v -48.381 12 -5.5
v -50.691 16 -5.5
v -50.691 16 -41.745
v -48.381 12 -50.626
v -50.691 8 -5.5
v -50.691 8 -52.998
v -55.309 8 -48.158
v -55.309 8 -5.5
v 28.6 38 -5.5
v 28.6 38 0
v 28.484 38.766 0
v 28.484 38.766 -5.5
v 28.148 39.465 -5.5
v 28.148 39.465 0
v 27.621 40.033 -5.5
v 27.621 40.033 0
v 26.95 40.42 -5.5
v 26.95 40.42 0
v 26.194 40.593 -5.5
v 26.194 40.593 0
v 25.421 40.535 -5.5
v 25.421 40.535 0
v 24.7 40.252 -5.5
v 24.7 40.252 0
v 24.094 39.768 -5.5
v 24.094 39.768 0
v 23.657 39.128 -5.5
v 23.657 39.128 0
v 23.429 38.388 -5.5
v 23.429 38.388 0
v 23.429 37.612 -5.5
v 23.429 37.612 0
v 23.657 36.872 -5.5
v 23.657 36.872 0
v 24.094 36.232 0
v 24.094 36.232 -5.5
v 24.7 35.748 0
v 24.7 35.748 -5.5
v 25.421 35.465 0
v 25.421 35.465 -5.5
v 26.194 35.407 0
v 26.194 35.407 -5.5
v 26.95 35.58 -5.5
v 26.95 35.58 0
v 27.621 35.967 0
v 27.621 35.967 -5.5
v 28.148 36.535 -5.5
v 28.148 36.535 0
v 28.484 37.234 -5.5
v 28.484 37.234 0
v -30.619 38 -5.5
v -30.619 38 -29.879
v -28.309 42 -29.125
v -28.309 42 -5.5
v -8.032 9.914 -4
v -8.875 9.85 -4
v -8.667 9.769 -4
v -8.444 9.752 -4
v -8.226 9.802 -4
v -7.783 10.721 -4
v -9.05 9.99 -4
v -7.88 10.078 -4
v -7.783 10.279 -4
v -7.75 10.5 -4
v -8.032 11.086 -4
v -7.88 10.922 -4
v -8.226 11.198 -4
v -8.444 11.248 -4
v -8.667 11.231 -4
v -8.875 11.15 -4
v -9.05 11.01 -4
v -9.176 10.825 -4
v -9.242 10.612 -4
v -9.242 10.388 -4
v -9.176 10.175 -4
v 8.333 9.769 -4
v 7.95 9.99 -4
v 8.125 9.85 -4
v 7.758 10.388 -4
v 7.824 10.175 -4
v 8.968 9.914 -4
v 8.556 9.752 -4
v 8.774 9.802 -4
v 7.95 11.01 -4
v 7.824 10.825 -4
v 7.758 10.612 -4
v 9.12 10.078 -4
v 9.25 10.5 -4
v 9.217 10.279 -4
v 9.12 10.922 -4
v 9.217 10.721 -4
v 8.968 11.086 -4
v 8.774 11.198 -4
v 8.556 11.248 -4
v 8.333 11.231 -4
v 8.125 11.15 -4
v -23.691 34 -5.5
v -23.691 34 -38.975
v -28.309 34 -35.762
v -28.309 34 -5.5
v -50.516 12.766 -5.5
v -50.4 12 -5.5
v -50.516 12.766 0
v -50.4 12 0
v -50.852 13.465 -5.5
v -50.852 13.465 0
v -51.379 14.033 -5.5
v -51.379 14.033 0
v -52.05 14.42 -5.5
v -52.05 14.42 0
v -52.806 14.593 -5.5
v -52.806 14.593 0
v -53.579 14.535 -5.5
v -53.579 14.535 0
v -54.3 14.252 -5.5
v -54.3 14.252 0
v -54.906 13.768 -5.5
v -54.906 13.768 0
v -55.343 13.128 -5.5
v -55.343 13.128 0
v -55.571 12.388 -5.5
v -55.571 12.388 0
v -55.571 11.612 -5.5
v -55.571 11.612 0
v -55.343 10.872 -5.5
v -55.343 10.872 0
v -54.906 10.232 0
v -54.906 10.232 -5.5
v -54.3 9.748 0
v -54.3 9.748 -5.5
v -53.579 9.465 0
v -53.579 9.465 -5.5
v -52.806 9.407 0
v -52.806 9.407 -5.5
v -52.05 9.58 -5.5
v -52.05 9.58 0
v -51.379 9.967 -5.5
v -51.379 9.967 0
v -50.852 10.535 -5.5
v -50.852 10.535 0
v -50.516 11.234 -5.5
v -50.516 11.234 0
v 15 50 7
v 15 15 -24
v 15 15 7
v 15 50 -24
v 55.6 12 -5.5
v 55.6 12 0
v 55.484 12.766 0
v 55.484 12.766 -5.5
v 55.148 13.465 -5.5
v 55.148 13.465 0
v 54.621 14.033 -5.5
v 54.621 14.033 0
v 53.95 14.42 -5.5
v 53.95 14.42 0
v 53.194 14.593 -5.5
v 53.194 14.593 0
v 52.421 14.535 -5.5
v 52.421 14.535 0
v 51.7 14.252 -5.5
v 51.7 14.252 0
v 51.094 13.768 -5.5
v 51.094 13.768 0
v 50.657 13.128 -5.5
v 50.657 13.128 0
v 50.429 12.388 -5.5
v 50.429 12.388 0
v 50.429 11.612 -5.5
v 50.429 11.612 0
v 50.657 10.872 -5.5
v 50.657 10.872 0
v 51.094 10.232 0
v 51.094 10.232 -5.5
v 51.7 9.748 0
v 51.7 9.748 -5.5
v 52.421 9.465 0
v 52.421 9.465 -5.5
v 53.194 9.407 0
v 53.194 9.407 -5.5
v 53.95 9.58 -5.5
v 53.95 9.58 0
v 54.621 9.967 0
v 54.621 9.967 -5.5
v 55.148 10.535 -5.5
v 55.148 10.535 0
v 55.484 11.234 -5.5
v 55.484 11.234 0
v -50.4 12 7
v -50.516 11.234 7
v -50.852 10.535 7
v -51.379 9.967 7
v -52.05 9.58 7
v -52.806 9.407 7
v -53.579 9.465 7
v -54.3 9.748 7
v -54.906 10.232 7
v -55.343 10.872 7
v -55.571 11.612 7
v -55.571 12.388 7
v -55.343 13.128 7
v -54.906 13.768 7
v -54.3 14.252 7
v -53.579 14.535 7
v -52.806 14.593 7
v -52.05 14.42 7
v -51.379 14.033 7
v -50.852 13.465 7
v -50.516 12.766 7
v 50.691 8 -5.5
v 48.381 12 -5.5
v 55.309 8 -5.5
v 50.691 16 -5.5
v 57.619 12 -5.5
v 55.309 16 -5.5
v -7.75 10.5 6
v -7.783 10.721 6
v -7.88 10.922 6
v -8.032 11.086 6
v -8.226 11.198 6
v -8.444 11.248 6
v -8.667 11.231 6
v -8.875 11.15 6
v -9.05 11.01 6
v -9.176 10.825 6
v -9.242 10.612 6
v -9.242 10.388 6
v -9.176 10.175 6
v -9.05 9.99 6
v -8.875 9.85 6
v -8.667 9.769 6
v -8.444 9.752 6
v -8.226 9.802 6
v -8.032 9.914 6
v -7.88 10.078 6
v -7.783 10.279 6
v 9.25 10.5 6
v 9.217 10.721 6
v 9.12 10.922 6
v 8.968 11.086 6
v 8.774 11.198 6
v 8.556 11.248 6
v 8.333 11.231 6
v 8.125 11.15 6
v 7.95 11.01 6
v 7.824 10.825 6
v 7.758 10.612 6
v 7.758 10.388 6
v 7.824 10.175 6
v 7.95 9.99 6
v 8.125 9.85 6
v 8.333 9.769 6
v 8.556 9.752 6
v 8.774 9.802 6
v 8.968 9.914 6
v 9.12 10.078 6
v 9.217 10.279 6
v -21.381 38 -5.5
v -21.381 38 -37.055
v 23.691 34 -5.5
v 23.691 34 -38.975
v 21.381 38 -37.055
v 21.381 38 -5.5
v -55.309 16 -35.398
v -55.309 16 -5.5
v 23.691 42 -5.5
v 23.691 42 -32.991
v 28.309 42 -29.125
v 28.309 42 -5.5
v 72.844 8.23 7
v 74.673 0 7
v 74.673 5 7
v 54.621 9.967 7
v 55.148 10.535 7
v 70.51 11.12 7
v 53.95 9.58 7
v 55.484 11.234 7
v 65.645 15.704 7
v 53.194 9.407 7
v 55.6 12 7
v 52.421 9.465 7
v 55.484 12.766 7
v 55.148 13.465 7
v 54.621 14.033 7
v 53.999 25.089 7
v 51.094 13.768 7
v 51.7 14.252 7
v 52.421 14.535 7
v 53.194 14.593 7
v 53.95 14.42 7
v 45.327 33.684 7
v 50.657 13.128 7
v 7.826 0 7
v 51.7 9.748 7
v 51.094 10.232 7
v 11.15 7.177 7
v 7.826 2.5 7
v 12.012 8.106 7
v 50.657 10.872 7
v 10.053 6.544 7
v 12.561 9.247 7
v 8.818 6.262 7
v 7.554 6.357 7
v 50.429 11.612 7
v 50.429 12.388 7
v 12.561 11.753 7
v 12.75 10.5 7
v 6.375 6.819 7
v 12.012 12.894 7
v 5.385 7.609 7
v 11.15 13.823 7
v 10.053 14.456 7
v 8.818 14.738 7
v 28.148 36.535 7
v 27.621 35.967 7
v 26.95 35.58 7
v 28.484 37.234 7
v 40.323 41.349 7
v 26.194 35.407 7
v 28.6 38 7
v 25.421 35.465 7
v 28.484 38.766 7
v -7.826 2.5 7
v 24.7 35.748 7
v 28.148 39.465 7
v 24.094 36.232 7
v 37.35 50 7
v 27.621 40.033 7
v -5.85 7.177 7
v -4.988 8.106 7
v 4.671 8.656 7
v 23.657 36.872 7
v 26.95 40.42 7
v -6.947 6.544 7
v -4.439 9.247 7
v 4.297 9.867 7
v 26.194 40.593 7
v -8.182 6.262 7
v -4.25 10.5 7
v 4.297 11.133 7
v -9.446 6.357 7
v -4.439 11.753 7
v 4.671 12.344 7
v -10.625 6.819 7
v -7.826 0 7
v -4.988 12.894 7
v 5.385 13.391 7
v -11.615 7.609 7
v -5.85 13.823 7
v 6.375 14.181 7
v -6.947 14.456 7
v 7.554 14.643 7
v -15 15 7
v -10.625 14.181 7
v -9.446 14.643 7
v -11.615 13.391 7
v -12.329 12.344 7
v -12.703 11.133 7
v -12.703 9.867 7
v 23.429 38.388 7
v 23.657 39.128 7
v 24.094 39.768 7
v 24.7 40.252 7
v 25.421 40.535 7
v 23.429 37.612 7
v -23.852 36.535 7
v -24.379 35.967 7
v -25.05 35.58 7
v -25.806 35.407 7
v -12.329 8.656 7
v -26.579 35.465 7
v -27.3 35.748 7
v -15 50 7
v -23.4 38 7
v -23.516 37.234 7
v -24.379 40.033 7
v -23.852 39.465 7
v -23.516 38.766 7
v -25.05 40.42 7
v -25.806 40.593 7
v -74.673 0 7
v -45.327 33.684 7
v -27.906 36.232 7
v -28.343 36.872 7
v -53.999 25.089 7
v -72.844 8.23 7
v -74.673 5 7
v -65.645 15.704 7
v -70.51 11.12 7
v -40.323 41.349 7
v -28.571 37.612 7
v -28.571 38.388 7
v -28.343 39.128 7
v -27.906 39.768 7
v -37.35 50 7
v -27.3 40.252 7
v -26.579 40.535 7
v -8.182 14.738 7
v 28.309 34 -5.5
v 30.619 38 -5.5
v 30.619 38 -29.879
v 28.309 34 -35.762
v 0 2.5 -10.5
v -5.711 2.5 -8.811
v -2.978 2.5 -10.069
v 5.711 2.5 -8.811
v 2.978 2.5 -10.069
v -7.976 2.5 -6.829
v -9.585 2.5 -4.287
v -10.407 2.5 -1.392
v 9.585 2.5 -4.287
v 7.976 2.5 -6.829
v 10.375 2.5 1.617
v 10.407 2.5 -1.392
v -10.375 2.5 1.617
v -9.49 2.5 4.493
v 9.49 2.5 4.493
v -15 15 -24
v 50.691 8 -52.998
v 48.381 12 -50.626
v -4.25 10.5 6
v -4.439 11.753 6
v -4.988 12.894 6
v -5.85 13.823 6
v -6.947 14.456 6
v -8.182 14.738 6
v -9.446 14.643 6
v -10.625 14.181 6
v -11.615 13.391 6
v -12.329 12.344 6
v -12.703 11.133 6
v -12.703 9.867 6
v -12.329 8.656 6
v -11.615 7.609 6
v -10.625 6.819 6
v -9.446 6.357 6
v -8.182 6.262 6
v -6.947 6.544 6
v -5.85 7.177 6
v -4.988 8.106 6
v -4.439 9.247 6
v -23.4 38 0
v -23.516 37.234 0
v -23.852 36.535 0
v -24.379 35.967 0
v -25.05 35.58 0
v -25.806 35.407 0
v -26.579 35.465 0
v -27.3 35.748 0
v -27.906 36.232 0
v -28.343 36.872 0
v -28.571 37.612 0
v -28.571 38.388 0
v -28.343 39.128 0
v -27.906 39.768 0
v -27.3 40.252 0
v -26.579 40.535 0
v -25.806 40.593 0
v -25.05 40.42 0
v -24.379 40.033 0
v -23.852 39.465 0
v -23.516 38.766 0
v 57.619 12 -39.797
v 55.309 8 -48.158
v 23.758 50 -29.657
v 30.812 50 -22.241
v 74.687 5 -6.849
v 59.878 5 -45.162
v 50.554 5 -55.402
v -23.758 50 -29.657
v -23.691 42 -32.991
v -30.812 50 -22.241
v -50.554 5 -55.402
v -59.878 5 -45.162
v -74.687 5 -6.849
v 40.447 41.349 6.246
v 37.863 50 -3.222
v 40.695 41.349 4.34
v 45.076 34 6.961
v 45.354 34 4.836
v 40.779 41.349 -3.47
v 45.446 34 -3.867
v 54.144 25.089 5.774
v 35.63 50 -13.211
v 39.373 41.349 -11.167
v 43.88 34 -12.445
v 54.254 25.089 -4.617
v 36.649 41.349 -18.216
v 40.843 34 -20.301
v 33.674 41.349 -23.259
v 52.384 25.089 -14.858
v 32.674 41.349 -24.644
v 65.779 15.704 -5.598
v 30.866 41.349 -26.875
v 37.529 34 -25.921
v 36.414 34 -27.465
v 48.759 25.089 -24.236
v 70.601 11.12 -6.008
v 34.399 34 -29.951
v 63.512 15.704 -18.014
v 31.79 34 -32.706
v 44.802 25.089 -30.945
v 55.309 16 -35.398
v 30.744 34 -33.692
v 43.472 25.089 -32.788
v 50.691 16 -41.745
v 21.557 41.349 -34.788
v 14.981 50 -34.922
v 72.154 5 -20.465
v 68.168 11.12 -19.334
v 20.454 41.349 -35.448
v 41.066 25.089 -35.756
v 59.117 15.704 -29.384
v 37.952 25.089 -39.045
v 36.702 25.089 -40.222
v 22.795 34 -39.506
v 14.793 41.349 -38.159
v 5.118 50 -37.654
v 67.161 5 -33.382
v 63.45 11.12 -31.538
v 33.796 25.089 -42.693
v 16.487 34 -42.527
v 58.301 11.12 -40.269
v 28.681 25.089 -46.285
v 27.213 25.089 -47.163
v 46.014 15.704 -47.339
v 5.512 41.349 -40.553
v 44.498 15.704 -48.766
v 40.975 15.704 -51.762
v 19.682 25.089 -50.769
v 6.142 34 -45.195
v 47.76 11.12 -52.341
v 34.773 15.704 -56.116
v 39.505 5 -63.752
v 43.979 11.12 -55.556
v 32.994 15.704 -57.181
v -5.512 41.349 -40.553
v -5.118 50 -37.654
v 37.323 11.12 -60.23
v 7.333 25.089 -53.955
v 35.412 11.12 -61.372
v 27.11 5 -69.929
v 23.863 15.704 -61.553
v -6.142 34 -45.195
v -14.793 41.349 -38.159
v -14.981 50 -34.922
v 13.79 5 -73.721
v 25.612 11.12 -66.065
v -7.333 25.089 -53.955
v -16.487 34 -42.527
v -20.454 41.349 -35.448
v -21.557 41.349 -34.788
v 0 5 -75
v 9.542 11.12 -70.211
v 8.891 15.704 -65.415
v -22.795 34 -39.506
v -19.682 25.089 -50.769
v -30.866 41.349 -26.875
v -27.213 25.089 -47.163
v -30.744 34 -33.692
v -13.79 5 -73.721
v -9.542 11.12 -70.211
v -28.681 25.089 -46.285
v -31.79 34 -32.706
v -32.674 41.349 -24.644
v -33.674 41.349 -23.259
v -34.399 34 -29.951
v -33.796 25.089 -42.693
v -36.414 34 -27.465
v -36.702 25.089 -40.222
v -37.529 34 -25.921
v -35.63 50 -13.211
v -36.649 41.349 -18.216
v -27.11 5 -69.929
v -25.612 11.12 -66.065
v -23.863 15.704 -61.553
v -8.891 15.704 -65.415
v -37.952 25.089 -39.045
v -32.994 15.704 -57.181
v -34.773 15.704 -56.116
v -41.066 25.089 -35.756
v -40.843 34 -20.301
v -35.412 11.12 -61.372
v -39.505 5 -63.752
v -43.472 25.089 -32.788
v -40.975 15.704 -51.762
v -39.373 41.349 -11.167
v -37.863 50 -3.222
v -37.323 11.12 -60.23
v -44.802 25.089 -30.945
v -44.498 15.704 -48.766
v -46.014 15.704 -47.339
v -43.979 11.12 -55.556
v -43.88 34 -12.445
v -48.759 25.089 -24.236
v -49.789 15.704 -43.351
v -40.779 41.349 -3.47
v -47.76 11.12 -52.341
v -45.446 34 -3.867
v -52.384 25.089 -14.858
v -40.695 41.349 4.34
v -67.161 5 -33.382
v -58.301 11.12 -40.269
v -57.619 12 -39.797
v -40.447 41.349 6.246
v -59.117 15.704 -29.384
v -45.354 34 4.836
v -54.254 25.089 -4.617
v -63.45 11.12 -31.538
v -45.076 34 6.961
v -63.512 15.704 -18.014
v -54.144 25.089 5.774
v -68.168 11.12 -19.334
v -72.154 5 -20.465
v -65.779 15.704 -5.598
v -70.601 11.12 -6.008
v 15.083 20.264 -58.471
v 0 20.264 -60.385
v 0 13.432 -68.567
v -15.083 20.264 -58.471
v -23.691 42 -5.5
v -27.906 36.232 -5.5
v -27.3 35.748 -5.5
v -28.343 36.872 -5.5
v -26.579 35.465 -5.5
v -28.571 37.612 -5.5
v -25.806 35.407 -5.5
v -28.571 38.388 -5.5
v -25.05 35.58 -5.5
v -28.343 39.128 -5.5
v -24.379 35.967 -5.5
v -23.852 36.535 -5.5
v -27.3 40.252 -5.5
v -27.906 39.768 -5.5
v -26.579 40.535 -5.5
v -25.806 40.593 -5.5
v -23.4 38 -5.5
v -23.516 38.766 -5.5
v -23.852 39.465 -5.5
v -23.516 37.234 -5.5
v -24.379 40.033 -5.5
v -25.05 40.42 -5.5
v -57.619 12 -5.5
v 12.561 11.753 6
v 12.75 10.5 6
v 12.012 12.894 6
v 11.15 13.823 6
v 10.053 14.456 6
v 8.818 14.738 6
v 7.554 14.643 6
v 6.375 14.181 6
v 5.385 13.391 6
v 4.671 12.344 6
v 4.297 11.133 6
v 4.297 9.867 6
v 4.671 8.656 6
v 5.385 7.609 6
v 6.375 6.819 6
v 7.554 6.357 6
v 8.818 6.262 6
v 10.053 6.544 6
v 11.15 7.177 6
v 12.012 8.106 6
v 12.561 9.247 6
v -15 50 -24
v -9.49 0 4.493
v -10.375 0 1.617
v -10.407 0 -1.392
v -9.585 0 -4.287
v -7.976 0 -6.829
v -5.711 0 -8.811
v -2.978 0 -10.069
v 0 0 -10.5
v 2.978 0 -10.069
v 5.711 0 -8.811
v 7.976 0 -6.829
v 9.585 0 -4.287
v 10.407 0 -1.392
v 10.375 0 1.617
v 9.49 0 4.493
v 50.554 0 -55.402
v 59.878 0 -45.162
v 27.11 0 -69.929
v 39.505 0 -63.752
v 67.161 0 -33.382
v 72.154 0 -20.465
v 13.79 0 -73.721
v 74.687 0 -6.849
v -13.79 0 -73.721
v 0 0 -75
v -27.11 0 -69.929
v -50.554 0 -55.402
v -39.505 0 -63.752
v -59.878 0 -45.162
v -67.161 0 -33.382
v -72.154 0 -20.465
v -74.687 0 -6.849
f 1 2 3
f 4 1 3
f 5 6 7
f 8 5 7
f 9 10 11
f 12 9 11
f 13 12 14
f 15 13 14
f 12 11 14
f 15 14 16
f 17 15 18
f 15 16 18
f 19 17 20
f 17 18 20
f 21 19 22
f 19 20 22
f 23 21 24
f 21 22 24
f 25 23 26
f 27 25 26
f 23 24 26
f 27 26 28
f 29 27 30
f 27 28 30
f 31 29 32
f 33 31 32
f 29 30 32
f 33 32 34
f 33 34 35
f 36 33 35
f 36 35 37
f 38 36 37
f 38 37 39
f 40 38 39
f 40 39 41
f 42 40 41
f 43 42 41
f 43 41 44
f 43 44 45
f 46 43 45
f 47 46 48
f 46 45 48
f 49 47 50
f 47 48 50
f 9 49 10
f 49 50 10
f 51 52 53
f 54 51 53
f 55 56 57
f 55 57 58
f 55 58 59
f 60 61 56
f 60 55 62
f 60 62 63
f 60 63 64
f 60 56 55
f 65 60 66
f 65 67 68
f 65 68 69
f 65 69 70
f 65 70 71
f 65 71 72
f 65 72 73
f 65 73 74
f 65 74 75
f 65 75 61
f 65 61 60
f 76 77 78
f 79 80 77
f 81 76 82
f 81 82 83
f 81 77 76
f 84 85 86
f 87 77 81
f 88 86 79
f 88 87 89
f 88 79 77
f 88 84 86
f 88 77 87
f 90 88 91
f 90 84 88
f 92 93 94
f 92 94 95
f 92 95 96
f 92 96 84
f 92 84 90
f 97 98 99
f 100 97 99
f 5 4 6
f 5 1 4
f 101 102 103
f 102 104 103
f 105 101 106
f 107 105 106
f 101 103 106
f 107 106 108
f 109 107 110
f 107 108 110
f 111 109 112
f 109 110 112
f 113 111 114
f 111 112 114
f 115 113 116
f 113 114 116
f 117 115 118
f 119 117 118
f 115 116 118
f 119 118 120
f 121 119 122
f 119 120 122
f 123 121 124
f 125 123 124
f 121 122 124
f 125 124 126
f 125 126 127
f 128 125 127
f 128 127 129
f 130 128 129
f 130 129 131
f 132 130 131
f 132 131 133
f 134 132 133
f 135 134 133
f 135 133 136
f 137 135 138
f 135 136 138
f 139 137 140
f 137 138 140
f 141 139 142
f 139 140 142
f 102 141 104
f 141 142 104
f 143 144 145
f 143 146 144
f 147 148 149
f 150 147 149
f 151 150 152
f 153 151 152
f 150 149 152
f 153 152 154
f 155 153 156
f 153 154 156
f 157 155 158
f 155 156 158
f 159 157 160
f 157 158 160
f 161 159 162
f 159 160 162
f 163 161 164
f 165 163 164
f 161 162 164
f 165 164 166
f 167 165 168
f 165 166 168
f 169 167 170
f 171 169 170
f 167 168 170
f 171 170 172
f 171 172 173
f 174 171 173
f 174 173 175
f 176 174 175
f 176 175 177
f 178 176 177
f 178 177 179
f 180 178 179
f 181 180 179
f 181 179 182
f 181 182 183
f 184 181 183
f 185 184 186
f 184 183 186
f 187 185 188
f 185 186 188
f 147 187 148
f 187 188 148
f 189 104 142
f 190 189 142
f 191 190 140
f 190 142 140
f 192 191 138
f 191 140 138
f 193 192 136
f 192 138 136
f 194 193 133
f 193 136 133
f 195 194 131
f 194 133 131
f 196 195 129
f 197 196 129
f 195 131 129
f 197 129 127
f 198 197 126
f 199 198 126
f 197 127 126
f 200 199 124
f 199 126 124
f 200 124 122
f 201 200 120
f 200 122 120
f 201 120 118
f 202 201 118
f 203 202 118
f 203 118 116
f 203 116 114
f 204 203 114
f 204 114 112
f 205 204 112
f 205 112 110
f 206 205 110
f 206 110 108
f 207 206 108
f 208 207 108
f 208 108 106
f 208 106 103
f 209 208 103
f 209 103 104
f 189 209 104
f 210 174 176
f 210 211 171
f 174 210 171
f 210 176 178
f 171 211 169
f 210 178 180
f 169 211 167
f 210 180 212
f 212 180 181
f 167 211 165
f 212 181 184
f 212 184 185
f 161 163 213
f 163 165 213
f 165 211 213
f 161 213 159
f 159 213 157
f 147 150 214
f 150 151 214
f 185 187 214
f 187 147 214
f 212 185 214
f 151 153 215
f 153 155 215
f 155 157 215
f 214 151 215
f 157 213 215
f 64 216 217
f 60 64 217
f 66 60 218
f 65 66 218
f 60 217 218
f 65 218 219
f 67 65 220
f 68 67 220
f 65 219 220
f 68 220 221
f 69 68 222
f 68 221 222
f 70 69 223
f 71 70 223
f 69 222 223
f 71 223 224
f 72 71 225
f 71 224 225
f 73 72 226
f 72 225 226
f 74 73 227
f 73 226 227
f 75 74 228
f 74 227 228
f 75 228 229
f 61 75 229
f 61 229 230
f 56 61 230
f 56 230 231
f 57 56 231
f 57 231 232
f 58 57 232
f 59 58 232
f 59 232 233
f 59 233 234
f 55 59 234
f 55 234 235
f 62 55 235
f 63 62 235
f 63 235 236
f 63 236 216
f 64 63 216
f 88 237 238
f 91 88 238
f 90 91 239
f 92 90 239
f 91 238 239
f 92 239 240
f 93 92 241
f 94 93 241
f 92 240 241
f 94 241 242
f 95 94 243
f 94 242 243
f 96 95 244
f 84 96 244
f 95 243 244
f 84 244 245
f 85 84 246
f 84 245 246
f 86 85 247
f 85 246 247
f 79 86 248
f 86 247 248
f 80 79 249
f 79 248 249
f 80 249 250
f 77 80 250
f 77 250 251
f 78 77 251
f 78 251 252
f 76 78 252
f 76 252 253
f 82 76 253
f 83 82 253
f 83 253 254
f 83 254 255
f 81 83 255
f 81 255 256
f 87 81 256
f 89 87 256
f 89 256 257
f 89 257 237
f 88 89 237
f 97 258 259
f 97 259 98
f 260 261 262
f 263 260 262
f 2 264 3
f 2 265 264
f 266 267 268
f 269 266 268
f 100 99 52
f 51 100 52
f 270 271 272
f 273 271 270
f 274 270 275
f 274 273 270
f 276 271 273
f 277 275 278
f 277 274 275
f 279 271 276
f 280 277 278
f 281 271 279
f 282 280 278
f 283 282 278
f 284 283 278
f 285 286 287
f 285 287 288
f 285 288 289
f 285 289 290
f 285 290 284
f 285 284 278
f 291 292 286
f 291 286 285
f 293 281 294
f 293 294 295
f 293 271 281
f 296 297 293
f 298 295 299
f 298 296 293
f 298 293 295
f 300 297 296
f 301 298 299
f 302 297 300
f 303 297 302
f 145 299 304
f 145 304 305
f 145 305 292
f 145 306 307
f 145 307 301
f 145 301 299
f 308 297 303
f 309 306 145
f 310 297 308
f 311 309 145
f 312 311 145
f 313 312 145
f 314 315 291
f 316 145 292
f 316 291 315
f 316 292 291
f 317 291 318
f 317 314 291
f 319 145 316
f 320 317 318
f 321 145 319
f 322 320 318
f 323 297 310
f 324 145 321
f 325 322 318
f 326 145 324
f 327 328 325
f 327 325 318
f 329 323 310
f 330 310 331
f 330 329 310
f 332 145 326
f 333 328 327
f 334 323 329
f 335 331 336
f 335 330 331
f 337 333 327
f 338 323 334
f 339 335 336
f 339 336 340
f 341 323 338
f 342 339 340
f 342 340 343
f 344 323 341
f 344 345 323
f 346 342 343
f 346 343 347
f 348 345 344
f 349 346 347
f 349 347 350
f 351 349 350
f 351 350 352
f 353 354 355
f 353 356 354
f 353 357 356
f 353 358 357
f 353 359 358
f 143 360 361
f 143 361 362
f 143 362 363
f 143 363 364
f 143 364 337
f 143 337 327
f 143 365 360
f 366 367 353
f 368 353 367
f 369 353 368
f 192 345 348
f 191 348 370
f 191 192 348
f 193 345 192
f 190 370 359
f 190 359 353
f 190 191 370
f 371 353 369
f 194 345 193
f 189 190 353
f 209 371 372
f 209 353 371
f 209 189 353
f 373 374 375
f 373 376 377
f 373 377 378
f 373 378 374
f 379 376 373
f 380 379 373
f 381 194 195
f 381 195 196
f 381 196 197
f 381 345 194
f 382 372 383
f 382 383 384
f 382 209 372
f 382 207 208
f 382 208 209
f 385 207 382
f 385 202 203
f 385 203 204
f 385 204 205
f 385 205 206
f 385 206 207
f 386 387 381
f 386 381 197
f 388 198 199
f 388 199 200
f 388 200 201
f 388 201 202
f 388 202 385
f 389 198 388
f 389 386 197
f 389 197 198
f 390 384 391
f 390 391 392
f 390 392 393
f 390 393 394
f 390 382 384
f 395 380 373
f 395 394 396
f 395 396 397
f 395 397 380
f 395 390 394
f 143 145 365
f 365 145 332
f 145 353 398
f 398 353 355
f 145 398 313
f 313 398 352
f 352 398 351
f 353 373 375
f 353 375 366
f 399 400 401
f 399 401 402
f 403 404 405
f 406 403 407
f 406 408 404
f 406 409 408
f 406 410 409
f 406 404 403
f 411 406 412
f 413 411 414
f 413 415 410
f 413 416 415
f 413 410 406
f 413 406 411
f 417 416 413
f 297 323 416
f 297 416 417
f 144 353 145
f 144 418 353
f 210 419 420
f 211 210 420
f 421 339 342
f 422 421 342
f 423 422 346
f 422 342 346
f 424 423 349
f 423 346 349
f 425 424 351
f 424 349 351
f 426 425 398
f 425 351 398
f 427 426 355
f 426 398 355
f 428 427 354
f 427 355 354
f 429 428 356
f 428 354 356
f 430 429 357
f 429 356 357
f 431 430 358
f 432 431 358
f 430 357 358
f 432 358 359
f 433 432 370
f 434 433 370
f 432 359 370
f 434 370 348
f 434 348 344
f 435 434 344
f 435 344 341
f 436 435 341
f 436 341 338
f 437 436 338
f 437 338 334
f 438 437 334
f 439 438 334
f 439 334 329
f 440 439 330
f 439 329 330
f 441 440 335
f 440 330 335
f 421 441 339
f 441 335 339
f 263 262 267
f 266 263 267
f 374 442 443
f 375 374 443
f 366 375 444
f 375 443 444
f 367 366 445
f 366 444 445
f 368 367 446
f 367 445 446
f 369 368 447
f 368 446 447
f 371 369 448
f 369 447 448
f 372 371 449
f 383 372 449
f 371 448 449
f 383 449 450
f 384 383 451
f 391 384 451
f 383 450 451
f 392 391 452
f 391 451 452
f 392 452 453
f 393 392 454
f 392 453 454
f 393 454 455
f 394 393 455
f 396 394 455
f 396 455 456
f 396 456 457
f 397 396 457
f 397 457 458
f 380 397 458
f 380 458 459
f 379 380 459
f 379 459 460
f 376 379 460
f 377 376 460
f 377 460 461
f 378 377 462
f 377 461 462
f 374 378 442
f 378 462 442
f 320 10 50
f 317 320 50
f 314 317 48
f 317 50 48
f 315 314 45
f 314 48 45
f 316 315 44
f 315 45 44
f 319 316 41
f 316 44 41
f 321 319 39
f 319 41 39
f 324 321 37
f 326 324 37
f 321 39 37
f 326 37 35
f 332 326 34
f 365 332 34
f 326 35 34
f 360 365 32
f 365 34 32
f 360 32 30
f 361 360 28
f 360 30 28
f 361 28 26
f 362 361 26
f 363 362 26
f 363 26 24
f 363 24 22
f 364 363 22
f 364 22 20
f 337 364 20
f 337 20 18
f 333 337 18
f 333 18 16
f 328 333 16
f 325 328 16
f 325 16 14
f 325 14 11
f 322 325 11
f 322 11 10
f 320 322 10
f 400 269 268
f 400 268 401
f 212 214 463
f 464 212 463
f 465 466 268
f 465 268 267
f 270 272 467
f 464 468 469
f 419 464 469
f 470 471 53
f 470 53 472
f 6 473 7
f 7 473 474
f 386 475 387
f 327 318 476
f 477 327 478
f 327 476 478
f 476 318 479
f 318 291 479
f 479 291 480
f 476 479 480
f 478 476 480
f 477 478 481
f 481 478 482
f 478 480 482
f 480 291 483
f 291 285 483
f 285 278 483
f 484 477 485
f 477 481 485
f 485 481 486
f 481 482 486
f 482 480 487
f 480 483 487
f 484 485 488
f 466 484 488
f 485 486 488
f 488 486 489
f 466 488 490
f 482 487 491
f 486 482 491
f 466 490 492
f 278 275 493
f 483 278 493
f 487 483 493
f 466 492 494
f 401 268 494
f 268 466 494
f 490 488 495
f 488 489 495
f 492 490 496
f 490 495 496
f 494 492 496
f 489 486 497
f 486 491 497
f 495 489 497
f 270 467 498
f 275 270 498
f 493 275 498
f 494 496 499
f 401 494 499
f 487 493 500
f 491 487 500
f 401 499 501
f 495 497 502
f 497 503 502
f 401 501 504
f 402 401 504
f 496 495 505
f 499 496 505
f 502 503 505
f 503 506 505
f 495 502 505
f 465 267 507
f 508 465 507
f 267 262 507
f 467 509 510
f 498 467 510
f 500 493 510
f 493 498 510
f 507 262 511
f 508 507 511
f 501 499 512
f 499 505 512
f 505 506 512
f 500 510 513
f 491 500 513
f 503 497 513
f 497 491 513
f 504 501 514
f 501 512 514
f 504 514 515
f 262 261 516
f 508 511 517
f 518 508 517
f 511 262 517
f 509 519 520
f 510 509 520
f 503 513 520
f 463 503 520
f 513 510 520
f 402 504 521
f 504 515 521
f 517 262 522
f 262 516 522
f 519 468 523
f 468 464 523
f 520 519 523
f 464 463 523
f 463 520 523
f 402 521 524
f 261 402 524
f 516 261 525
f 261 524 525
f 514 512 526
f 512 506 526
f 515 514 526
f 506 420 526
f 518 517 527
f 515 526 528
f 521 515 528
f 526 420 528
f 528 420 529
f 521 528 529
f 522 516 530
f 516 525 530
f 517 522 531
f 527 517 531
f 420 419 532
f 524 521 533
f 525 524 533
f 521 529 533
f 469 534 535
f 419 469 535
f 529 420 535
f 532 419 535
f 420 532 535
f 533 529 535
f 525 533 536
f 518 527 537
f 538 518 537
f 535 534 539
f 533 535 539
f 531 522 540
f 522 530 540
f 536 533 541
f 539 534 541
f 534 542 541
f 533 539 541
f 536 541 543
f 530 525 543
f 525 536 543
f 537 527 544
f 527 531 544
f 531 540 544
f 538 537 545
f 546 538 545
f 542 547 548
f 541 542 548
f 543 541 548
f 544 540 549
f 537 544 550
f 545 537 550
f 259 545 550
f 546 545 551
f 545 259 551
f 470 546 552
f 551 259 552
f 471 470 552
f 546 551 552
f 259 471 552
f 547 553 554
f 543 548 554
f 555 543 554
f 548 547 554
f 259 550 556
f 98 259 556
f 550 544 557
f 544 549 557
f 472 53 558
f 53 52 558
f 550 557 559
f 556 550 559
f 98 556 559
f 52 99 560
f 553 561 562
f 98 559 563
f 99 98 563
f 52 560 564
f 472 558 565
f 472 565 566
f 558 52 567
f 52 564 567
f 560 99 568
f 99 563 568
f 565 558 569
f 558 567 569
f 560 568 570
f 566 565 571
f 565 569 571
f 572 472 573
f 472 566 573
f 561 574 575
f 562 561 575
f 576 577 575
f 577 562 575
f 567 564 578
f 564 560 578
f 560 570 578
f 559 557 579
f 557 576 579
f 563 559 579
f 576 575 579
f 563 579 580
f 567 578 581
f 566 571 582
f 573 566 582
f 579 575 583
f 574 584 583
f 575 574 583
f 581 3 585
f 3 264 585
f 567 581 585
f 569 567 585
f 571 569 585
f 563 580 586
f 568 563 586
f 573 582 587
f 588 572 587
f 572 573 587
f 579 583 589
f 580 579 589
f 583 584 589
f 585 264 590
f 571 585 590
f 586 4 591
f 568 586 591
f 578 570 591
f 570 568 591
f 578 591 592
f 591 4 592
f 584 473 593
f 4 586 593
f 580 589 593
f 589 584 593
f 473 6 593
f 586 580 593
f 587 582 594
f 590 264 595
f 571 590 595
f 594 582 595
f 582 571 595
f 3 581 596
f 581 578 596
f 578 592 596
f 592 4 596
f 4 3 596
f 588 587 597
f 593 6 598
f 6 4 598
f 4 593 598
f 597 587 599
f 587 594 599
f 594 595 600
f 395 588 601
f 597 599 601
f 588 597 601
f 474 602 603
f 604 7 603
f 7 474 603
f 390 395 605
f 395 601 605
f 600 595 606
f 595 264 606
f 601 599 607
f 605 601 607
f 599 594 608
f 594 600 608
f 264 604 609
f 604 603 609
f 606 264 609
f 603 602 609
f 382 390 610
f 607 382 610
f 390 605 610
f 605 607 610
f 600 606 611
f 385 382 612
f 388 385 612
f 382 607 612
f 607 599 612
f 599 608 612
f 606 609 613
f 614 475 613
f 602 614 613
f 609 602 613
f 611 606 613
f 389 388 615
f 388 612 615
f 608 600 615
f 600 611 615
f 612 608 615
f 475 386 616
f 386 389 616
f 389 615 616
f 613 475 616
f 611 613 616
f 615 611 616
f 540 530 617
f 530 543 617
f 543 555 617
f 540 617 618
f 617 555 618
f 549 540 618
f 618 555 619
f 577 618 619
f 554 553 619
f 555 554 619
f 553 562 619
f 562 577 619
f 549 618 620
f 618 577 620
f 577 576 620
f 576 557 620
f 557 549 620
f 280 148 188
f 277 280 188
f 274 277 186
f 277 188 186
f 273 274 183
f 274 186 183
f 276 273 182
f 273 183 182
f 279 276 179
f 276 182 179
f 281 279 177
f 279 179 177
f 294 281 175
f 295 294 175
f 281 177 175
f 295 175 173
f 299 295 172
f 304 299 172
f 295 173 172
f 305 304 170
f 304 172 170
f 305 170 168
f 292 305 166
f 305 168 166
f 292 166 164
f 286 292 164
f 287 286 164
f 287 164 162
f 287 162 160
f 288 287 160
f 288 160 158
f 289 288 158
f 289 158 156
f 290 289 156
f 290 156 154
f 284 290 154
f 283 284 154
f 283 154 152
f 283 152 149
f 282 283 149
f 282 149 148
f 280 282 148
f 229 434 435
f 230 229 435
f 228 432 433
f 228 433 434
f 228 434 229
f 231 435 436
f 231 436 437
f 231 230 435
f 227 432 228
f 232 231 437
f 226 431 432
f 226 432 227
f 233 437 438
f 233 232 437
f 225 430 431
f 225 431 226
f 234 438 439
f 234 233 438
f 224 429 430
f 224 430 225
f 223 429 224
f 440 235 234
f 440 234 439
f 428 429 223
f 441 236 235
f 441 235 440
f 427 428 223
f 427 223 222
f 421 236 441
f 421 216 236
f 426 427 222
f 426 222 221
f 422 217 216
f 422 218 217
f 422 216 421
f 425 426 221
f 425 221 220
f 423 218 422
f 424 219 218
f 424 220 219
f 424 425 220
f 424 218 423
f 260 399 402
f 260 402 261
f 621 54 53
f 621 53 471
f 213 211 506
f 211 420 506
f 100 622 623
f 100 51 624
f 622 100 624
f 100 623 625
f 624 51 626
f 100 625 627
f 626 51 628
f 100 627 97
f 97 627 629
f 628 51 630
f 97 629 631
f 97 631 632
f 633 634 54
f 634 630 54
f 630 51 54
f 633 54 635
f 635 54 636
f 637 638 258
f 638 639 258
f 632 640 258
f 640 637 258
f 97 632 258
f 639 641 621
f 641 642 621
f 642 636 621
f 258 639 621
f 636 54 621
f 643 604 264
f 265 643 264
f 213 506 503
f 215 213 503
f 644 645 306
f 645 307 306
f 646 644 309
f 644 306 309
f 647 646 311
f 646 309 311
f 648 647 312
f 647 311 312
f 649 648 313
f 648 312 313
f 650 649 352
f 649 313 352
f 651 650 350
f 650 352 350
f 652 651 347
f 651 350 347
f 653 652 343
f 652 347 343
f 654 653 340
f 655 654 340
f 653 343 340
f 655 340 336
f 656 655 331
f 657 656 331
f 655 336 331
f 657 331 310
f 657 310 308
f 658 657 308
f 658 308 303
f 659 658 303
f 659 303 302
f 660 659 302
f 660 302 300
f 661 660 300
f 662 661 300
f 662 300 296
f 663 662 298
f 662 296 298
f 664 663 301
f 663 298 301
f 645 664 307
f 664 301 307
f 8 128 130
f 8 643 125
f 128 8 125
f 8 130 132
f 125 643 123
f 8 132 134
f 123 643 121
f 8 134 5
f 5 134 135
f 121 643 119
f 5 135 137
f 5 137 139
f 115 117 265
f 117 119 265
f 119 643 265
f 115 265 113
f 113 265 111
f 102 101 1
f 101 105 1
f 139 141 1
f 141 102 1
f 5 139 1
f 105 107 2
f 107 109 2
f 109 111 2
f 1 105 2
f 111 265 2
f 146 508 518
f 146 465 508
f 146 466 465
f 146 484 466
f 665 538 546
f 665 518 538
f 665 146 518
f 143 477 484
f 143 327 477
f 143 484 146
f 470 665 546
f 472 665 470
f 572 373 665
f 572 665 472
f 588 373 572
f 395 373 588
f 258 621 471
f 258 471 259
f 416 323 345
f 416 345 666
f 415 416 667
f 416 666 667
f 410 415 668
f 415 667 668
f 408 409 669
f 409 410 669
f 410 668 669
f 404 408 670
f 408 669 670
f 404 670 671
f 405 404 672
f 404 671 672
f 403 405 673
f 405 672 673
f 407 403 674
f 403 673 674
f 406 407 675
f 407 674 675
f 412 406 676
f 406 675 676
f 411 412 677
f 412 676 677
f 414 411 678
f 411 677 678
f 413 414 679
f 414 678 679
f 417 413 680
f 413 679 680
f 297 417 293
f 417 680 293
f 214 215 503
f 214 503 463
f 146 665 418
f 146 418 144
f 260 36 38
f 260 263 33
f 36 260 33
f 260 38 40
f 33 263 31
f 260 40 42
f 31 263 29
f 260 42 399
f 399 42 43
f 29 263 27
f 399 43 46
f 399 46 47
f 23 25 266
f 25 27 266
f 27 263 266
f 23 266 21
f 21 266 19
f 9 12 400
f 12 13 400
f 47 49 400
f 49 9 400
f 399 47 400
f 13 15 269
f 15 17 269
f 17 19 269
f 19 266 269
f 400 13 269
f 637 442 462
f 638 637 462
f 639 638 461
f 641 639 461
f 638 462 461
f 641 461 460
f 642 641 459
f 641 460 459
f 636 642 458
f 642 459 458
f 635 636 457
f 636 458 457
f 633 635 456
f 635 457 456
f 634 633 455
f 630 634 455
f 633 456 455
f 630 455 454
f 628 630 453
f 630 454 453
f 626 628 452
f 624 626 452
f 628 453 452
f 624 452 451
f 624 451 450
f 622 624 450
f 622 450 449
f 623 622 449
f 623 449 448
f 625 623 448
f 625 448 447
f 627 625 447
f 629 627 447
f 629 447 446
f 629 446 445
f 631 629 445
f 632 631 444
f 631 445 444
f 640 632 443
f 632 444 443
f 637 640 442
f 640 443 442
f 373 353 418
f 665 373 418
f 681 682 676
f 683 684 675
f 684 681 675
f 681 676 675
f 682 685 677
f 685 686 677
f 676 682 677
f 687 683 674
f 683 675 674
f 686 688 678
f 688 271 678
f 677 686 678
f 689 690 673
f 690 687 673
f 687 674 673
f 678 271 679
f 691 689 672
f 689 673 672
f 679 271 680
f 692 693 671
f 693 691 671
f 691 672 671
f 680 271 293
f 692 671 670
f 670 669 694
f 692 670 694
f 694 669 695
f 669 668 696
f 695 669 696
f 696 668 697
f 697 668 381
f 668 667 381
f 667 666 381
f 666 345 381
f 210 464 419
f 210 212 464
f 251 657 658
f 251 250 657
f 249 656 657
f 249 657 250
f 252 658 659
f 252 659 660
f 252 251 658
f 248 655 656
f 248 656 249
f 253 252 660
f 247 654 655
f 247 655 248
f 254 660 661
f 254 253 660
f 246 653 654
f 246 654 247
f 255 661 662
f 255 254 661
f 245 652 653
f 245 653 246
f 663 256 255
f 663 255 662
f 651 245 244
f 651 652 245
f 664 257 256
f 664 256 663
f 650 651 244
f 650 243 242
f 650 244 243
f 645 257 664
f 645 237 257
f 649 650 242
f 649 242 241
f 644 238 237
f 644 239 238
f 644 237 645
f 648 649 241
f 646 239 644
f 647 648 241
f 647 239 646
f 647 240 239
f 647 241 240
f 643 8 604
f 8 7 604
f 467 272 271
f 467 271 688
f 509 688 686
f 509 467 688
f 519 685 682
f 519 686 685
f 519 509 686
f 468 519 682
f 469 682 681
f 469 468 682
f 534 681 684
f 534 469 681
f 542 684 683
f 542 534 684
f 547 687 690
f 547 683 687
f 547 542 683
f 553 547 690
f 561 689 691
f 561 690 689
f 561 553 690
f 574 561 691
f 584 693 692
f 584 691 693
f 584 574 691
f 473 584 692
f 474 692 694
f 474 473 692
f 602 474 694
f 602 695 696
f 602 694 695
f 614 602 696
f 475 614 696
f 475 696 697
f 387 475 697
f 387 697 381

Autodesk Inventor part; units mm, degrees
ref_plane "YZ Plane" through (0, 0, 0) normal (1, 0, 0) x (0, 1, 0)
sketch "Sketch1" plane through (0, 0, 0) normal (0, 0, 1) x (1, 0, 0)
  line L0 (0, 0) -> (-75, 0)
  line L1 (0, 0) -> (0, 50)
  line L2 (0, 50) -> (-38, 50)
  line L3 (-75, 0) -> (-75, 5)
  spline S0 degree 3 poles (-38, 50) (-46.7224, 6.6996) (-125.1064, 18.5226) (-28.5296, -55.0422) knots 0 0 0 0 1 1 1 1
  point P0 (-58.1914, 22.009)
  dimension "d0" = 75
  dimension "d1" = 50
  dimension "d2" = 38
  dimension "d3" = 5
revolve "Revolution1" add sketch "Sketch1" angle 360 about axis through (0, 0, 0) along (0, 1, 0)
sketch "Sketch2" plane through (0, 50, 0) normal (0, 1, 0) x (1, 0, 0)
  line L0 (-15, 24) -> (15, 24)
  line L1 (15, 24) -> (15, -24)
  line L2 (15, -24) -> (-15, -24)
  line L3 (-15, -24) -> (-15, 24)
  point P0 (0, 0)
  dimension "d5" = 30
  dimension "d6" = 48
  dimension "d7" = 24
  dimension "d8" = 15
extrude "Extrusion1" cut sketch "Sketch2" against normal blind 35
sketch "Sketch3" plane through (0, 15, 0) normal (0, 1, 0) x (1, 0, 0)
  line L0 (15, -24) -> (-15, -24) projected
  line L1 (-15, -24) -> (-15, 24) projected
  line L2 (15, -24) -> (-15, -24)
  line L3 (-15, -24) -> (-15, -7)
  line L4 (-15, -7) -> (15, -7)
  line L5 (15, -7) -> (15, -24)
  point P0 (0, 0)
  dimension "d11" = 17
extrude "Extrusion2" cut sketch "Sketch3" against normal blind 8
sketch "Sketch4" plane through (0, 0, 0) normal (0, 0, 1) x (1, 0, 0)
  circle A0 centre (-26, 38) radius 2.6
  circle A1 centre (-53, 12) radius 2.6
  line L0 (75, 0) -> (-75, 0) projected
  line L1 (38, 50) -> (-38, 50) projected
  line L2 (-75, 0) -> (-75, 5) projected
  line L3 (15, 50) -> (-15, 50) construction
  line L4 (0, 50) -> (0, 20.8019) construction
  circle A2 centre (26, 38) radius 2.6
  circle A3 centre (53, 12) radius 2.6
  point P0 (0, 0)
  dimension "d14" = 5.2
  dimension "d15" = 5.2
  dimension "d16" = 12
  dimension "d17" = 12
  dimension "d18" = 22
  dimension "d19" = 12
extrude "Extrusion3" cut sketch "Sketch4" along normal blind 52 and the other way blind 52
ref_plane "Work Plane1" through (-15, 15, 7) normal (0, 0, 1) x (1, 0, 0)
split "Split1" plane through (-15, 15, 7) removes the side toward (0, 0, 1)
sketch "Sketch6" plane through (0, 0, 0) normal (0, -1, 0) x (1, 0, 0)
  circle A0 centre (0, 0) radius 10.5
  dimension "d25" = 21
extrude "Extrusion4" cut sketch "Sketch6" against normal blind 2.5
ref_plane "Work Plane2" through (-15, 15, -5.5) normal (0, 0, 1) x (1, 0, 0)
sketch "Sketch7" plane through (-15, 15, -5.5) normal (0, 0, 1) x (1, 0, 0)
  circle A0 centre (41, 23) radius 2.6 projected
  line L0 (38.6906, 27) -> (43.3094, 27)
  line L1 (43.3094, 27) -> (45.6188, 23)
  line L2 (45.6188, 23) -> (43.3094, 19)
  line L3 (43.3094, 19) -> (38.6906, 19)
  line L4 (38.6906, 19) -> (36.3812, 23)
  line L5 (36.3812, 23) -> (38.6906, 27)
  circle A1 centre (-11, 23) radius 2.6 projected
  line L6 (-13.3094, 27) -> (-8.6906, 27)
  line L7 (-8.6906, 27) -> (-6.3812, 23)
  line L8 (-6.3812, 23) -> (-8.6906, 19)
  line L9 (-8.6906, 19) -> (-13.3094, 19)
  line L10 (-13.3094, 19) -> (-15.6188, 23)
  line L11 (-15.6188, 23) -> (-13.3094, 27)
  circle A2 centre (-38, -3) radius 2.6 projected
  line L12 (-35.6906, 1) -> (-33.3812, -3)
  line L13 (-33.3812, -3) -> (-35.6906, -7)
  line L14 (-35.6906, -7) -> (-40.3094, -7)
  line L15 (-40.3094, -7) -> (-42.6188, -3)
  line L16 (-42.6188, -3) -> (-40.3094, 1)
  line L17 (-40.3094, 1) -> (-35.6906, 1)
  circle A3 centre (68, -3) radius 2.6 projected
  line L18 (65.6906, 1) -> (70.3094, 1)
  line L19 (70.3094, 1) -> (72.6188, -3)
  line L20 (72.6188, -3) -> (70.3094, -7)
  line L21 (70.3094, -7) -> (65.6906, -7)
  line L22 (65.6906, -7) -> (63.3812, -3)
  line L23 (63.3812, -3) -> (65.6906, 1)
  line L24 (30, 35) -> (52.3497, 35) projected
  line L25 (-22.3497, 35) -> (0, 35) projected
  point P0 (15, -15)
  dimension "d29" = 8
  dimension "d30" = 8
  dimension "d31" = 8
  dimension "d32" = 8
extrude "Extrusion5" cut sketch "Sketch7" against normal blind 50 contours A0 | L0 L1 L2 L3 L4 L5 | A1 | L6 L7 L8 L9 L10 L11 | A2 | L12 L13 L14 L15 L16 L17 | A3 | L18 L19 L20 L21 L22 L23
sketch "Sketch8" plane through (-15, 15, 7) normal (0, 0, 1) x (1, 0, 0)
  point P0 (15, -15)
sketch "Sketch9" plane through (-15, 15, 7) normal (0, 0, 1) x (1, 0, 0)
  arc A0 (8.3697, -6.5166) -> (4.6303, -6.5166) centre (6.5, -4.5) ccw
  arc A1 (25.3697, -6.5166) -> (22.2084, -6.9278) centre (23.5, -4.5) ccw
  circle A2 centre (6.5, -4.5) radius 4.25
  circle A3 centre (23.5, -4.5) radius 4.25
  line L0 (7.1738, -15) -> (-59.6726, -15)
  spline S0 degree 3 poles (-59.6726, -10) (-58.7689, -7.9323) (-57.4468, -6.0708) (-54.3242, -2.5217) (-52.3894, -0.7667) (-46.4805, 4.2144) (-41.726, 7.6418) (-33.4997, 14.92) (-30.0416, 18.5511) (-24.9099, 26.5974) (-23.2478, 30.6178) (-22.3497, 35) knots -6.163162 -6.163162 -6.163162 -6.163162 -5.426539 -5.426539 -4.614235 -4.614235 -2.856788 -2.856788 -1.341997 -1.341997 0 0 0 0
  line L1 (-59.6726, -15) -> (-59.6726, -10)
  line L2 (-22.3497, 35) -> (0, 35)
  spline S1 degree 3 poles (52.3497, 35) (53.0647, 31.5111) (54.27, 28.2261) (57.5622, 22.1809) (59.5109, 19.5298) (66.0487, 12.2093) (71.1762, 8.2595) (79.7672, 1.4925) (83.3346, -1.3766) (87.4881, -6.1291) (88.7829, -7.9645) (89.6726, -10) knots -5.079654 -5.079654 -5.079654 -5.079654 -4.231884 -4.231884 -3.44283 -3.44283 -1.900227 -1.900227 -0.666449 -0.666449 0 0 0 0
  line L3 (30, 35) -> (52.3497, 35)
  line L4 (89.6726, -10) -> (89.6726, -15)
  line L5 (89.6726, -15) -> (22.8262, -15)
  point P0 (15, -15)
  dimension "d35" = 8.5
  dimension "d36" = 8.5
extrude "Extrusion6" cut sketch "Sketch9" against normal blind 1
sketch "Sketch10" plane through (-8.5, 10.5, 6) normal (0, 0, 1) x (1, 0, 0)
  circle A0 centre (0, 0) radius 0.75
  circle A1 centre (17, 0) radius 4.25 projected
  circle A2 centre (17, 0) radius 0.75
  point P0 (8.5, -10.5)
  dimension "d39" = 1.5
  dimension "d40" = 1.5
extrude "Extrusion7" cut sketch "Sketch10" against normal blind 10 contours A0 | A2
equation "\"d7\" = 0.5 * d6"
equation "\"d8\" = 0.5 * d5"
properties part number "Podstawa 01-2"
